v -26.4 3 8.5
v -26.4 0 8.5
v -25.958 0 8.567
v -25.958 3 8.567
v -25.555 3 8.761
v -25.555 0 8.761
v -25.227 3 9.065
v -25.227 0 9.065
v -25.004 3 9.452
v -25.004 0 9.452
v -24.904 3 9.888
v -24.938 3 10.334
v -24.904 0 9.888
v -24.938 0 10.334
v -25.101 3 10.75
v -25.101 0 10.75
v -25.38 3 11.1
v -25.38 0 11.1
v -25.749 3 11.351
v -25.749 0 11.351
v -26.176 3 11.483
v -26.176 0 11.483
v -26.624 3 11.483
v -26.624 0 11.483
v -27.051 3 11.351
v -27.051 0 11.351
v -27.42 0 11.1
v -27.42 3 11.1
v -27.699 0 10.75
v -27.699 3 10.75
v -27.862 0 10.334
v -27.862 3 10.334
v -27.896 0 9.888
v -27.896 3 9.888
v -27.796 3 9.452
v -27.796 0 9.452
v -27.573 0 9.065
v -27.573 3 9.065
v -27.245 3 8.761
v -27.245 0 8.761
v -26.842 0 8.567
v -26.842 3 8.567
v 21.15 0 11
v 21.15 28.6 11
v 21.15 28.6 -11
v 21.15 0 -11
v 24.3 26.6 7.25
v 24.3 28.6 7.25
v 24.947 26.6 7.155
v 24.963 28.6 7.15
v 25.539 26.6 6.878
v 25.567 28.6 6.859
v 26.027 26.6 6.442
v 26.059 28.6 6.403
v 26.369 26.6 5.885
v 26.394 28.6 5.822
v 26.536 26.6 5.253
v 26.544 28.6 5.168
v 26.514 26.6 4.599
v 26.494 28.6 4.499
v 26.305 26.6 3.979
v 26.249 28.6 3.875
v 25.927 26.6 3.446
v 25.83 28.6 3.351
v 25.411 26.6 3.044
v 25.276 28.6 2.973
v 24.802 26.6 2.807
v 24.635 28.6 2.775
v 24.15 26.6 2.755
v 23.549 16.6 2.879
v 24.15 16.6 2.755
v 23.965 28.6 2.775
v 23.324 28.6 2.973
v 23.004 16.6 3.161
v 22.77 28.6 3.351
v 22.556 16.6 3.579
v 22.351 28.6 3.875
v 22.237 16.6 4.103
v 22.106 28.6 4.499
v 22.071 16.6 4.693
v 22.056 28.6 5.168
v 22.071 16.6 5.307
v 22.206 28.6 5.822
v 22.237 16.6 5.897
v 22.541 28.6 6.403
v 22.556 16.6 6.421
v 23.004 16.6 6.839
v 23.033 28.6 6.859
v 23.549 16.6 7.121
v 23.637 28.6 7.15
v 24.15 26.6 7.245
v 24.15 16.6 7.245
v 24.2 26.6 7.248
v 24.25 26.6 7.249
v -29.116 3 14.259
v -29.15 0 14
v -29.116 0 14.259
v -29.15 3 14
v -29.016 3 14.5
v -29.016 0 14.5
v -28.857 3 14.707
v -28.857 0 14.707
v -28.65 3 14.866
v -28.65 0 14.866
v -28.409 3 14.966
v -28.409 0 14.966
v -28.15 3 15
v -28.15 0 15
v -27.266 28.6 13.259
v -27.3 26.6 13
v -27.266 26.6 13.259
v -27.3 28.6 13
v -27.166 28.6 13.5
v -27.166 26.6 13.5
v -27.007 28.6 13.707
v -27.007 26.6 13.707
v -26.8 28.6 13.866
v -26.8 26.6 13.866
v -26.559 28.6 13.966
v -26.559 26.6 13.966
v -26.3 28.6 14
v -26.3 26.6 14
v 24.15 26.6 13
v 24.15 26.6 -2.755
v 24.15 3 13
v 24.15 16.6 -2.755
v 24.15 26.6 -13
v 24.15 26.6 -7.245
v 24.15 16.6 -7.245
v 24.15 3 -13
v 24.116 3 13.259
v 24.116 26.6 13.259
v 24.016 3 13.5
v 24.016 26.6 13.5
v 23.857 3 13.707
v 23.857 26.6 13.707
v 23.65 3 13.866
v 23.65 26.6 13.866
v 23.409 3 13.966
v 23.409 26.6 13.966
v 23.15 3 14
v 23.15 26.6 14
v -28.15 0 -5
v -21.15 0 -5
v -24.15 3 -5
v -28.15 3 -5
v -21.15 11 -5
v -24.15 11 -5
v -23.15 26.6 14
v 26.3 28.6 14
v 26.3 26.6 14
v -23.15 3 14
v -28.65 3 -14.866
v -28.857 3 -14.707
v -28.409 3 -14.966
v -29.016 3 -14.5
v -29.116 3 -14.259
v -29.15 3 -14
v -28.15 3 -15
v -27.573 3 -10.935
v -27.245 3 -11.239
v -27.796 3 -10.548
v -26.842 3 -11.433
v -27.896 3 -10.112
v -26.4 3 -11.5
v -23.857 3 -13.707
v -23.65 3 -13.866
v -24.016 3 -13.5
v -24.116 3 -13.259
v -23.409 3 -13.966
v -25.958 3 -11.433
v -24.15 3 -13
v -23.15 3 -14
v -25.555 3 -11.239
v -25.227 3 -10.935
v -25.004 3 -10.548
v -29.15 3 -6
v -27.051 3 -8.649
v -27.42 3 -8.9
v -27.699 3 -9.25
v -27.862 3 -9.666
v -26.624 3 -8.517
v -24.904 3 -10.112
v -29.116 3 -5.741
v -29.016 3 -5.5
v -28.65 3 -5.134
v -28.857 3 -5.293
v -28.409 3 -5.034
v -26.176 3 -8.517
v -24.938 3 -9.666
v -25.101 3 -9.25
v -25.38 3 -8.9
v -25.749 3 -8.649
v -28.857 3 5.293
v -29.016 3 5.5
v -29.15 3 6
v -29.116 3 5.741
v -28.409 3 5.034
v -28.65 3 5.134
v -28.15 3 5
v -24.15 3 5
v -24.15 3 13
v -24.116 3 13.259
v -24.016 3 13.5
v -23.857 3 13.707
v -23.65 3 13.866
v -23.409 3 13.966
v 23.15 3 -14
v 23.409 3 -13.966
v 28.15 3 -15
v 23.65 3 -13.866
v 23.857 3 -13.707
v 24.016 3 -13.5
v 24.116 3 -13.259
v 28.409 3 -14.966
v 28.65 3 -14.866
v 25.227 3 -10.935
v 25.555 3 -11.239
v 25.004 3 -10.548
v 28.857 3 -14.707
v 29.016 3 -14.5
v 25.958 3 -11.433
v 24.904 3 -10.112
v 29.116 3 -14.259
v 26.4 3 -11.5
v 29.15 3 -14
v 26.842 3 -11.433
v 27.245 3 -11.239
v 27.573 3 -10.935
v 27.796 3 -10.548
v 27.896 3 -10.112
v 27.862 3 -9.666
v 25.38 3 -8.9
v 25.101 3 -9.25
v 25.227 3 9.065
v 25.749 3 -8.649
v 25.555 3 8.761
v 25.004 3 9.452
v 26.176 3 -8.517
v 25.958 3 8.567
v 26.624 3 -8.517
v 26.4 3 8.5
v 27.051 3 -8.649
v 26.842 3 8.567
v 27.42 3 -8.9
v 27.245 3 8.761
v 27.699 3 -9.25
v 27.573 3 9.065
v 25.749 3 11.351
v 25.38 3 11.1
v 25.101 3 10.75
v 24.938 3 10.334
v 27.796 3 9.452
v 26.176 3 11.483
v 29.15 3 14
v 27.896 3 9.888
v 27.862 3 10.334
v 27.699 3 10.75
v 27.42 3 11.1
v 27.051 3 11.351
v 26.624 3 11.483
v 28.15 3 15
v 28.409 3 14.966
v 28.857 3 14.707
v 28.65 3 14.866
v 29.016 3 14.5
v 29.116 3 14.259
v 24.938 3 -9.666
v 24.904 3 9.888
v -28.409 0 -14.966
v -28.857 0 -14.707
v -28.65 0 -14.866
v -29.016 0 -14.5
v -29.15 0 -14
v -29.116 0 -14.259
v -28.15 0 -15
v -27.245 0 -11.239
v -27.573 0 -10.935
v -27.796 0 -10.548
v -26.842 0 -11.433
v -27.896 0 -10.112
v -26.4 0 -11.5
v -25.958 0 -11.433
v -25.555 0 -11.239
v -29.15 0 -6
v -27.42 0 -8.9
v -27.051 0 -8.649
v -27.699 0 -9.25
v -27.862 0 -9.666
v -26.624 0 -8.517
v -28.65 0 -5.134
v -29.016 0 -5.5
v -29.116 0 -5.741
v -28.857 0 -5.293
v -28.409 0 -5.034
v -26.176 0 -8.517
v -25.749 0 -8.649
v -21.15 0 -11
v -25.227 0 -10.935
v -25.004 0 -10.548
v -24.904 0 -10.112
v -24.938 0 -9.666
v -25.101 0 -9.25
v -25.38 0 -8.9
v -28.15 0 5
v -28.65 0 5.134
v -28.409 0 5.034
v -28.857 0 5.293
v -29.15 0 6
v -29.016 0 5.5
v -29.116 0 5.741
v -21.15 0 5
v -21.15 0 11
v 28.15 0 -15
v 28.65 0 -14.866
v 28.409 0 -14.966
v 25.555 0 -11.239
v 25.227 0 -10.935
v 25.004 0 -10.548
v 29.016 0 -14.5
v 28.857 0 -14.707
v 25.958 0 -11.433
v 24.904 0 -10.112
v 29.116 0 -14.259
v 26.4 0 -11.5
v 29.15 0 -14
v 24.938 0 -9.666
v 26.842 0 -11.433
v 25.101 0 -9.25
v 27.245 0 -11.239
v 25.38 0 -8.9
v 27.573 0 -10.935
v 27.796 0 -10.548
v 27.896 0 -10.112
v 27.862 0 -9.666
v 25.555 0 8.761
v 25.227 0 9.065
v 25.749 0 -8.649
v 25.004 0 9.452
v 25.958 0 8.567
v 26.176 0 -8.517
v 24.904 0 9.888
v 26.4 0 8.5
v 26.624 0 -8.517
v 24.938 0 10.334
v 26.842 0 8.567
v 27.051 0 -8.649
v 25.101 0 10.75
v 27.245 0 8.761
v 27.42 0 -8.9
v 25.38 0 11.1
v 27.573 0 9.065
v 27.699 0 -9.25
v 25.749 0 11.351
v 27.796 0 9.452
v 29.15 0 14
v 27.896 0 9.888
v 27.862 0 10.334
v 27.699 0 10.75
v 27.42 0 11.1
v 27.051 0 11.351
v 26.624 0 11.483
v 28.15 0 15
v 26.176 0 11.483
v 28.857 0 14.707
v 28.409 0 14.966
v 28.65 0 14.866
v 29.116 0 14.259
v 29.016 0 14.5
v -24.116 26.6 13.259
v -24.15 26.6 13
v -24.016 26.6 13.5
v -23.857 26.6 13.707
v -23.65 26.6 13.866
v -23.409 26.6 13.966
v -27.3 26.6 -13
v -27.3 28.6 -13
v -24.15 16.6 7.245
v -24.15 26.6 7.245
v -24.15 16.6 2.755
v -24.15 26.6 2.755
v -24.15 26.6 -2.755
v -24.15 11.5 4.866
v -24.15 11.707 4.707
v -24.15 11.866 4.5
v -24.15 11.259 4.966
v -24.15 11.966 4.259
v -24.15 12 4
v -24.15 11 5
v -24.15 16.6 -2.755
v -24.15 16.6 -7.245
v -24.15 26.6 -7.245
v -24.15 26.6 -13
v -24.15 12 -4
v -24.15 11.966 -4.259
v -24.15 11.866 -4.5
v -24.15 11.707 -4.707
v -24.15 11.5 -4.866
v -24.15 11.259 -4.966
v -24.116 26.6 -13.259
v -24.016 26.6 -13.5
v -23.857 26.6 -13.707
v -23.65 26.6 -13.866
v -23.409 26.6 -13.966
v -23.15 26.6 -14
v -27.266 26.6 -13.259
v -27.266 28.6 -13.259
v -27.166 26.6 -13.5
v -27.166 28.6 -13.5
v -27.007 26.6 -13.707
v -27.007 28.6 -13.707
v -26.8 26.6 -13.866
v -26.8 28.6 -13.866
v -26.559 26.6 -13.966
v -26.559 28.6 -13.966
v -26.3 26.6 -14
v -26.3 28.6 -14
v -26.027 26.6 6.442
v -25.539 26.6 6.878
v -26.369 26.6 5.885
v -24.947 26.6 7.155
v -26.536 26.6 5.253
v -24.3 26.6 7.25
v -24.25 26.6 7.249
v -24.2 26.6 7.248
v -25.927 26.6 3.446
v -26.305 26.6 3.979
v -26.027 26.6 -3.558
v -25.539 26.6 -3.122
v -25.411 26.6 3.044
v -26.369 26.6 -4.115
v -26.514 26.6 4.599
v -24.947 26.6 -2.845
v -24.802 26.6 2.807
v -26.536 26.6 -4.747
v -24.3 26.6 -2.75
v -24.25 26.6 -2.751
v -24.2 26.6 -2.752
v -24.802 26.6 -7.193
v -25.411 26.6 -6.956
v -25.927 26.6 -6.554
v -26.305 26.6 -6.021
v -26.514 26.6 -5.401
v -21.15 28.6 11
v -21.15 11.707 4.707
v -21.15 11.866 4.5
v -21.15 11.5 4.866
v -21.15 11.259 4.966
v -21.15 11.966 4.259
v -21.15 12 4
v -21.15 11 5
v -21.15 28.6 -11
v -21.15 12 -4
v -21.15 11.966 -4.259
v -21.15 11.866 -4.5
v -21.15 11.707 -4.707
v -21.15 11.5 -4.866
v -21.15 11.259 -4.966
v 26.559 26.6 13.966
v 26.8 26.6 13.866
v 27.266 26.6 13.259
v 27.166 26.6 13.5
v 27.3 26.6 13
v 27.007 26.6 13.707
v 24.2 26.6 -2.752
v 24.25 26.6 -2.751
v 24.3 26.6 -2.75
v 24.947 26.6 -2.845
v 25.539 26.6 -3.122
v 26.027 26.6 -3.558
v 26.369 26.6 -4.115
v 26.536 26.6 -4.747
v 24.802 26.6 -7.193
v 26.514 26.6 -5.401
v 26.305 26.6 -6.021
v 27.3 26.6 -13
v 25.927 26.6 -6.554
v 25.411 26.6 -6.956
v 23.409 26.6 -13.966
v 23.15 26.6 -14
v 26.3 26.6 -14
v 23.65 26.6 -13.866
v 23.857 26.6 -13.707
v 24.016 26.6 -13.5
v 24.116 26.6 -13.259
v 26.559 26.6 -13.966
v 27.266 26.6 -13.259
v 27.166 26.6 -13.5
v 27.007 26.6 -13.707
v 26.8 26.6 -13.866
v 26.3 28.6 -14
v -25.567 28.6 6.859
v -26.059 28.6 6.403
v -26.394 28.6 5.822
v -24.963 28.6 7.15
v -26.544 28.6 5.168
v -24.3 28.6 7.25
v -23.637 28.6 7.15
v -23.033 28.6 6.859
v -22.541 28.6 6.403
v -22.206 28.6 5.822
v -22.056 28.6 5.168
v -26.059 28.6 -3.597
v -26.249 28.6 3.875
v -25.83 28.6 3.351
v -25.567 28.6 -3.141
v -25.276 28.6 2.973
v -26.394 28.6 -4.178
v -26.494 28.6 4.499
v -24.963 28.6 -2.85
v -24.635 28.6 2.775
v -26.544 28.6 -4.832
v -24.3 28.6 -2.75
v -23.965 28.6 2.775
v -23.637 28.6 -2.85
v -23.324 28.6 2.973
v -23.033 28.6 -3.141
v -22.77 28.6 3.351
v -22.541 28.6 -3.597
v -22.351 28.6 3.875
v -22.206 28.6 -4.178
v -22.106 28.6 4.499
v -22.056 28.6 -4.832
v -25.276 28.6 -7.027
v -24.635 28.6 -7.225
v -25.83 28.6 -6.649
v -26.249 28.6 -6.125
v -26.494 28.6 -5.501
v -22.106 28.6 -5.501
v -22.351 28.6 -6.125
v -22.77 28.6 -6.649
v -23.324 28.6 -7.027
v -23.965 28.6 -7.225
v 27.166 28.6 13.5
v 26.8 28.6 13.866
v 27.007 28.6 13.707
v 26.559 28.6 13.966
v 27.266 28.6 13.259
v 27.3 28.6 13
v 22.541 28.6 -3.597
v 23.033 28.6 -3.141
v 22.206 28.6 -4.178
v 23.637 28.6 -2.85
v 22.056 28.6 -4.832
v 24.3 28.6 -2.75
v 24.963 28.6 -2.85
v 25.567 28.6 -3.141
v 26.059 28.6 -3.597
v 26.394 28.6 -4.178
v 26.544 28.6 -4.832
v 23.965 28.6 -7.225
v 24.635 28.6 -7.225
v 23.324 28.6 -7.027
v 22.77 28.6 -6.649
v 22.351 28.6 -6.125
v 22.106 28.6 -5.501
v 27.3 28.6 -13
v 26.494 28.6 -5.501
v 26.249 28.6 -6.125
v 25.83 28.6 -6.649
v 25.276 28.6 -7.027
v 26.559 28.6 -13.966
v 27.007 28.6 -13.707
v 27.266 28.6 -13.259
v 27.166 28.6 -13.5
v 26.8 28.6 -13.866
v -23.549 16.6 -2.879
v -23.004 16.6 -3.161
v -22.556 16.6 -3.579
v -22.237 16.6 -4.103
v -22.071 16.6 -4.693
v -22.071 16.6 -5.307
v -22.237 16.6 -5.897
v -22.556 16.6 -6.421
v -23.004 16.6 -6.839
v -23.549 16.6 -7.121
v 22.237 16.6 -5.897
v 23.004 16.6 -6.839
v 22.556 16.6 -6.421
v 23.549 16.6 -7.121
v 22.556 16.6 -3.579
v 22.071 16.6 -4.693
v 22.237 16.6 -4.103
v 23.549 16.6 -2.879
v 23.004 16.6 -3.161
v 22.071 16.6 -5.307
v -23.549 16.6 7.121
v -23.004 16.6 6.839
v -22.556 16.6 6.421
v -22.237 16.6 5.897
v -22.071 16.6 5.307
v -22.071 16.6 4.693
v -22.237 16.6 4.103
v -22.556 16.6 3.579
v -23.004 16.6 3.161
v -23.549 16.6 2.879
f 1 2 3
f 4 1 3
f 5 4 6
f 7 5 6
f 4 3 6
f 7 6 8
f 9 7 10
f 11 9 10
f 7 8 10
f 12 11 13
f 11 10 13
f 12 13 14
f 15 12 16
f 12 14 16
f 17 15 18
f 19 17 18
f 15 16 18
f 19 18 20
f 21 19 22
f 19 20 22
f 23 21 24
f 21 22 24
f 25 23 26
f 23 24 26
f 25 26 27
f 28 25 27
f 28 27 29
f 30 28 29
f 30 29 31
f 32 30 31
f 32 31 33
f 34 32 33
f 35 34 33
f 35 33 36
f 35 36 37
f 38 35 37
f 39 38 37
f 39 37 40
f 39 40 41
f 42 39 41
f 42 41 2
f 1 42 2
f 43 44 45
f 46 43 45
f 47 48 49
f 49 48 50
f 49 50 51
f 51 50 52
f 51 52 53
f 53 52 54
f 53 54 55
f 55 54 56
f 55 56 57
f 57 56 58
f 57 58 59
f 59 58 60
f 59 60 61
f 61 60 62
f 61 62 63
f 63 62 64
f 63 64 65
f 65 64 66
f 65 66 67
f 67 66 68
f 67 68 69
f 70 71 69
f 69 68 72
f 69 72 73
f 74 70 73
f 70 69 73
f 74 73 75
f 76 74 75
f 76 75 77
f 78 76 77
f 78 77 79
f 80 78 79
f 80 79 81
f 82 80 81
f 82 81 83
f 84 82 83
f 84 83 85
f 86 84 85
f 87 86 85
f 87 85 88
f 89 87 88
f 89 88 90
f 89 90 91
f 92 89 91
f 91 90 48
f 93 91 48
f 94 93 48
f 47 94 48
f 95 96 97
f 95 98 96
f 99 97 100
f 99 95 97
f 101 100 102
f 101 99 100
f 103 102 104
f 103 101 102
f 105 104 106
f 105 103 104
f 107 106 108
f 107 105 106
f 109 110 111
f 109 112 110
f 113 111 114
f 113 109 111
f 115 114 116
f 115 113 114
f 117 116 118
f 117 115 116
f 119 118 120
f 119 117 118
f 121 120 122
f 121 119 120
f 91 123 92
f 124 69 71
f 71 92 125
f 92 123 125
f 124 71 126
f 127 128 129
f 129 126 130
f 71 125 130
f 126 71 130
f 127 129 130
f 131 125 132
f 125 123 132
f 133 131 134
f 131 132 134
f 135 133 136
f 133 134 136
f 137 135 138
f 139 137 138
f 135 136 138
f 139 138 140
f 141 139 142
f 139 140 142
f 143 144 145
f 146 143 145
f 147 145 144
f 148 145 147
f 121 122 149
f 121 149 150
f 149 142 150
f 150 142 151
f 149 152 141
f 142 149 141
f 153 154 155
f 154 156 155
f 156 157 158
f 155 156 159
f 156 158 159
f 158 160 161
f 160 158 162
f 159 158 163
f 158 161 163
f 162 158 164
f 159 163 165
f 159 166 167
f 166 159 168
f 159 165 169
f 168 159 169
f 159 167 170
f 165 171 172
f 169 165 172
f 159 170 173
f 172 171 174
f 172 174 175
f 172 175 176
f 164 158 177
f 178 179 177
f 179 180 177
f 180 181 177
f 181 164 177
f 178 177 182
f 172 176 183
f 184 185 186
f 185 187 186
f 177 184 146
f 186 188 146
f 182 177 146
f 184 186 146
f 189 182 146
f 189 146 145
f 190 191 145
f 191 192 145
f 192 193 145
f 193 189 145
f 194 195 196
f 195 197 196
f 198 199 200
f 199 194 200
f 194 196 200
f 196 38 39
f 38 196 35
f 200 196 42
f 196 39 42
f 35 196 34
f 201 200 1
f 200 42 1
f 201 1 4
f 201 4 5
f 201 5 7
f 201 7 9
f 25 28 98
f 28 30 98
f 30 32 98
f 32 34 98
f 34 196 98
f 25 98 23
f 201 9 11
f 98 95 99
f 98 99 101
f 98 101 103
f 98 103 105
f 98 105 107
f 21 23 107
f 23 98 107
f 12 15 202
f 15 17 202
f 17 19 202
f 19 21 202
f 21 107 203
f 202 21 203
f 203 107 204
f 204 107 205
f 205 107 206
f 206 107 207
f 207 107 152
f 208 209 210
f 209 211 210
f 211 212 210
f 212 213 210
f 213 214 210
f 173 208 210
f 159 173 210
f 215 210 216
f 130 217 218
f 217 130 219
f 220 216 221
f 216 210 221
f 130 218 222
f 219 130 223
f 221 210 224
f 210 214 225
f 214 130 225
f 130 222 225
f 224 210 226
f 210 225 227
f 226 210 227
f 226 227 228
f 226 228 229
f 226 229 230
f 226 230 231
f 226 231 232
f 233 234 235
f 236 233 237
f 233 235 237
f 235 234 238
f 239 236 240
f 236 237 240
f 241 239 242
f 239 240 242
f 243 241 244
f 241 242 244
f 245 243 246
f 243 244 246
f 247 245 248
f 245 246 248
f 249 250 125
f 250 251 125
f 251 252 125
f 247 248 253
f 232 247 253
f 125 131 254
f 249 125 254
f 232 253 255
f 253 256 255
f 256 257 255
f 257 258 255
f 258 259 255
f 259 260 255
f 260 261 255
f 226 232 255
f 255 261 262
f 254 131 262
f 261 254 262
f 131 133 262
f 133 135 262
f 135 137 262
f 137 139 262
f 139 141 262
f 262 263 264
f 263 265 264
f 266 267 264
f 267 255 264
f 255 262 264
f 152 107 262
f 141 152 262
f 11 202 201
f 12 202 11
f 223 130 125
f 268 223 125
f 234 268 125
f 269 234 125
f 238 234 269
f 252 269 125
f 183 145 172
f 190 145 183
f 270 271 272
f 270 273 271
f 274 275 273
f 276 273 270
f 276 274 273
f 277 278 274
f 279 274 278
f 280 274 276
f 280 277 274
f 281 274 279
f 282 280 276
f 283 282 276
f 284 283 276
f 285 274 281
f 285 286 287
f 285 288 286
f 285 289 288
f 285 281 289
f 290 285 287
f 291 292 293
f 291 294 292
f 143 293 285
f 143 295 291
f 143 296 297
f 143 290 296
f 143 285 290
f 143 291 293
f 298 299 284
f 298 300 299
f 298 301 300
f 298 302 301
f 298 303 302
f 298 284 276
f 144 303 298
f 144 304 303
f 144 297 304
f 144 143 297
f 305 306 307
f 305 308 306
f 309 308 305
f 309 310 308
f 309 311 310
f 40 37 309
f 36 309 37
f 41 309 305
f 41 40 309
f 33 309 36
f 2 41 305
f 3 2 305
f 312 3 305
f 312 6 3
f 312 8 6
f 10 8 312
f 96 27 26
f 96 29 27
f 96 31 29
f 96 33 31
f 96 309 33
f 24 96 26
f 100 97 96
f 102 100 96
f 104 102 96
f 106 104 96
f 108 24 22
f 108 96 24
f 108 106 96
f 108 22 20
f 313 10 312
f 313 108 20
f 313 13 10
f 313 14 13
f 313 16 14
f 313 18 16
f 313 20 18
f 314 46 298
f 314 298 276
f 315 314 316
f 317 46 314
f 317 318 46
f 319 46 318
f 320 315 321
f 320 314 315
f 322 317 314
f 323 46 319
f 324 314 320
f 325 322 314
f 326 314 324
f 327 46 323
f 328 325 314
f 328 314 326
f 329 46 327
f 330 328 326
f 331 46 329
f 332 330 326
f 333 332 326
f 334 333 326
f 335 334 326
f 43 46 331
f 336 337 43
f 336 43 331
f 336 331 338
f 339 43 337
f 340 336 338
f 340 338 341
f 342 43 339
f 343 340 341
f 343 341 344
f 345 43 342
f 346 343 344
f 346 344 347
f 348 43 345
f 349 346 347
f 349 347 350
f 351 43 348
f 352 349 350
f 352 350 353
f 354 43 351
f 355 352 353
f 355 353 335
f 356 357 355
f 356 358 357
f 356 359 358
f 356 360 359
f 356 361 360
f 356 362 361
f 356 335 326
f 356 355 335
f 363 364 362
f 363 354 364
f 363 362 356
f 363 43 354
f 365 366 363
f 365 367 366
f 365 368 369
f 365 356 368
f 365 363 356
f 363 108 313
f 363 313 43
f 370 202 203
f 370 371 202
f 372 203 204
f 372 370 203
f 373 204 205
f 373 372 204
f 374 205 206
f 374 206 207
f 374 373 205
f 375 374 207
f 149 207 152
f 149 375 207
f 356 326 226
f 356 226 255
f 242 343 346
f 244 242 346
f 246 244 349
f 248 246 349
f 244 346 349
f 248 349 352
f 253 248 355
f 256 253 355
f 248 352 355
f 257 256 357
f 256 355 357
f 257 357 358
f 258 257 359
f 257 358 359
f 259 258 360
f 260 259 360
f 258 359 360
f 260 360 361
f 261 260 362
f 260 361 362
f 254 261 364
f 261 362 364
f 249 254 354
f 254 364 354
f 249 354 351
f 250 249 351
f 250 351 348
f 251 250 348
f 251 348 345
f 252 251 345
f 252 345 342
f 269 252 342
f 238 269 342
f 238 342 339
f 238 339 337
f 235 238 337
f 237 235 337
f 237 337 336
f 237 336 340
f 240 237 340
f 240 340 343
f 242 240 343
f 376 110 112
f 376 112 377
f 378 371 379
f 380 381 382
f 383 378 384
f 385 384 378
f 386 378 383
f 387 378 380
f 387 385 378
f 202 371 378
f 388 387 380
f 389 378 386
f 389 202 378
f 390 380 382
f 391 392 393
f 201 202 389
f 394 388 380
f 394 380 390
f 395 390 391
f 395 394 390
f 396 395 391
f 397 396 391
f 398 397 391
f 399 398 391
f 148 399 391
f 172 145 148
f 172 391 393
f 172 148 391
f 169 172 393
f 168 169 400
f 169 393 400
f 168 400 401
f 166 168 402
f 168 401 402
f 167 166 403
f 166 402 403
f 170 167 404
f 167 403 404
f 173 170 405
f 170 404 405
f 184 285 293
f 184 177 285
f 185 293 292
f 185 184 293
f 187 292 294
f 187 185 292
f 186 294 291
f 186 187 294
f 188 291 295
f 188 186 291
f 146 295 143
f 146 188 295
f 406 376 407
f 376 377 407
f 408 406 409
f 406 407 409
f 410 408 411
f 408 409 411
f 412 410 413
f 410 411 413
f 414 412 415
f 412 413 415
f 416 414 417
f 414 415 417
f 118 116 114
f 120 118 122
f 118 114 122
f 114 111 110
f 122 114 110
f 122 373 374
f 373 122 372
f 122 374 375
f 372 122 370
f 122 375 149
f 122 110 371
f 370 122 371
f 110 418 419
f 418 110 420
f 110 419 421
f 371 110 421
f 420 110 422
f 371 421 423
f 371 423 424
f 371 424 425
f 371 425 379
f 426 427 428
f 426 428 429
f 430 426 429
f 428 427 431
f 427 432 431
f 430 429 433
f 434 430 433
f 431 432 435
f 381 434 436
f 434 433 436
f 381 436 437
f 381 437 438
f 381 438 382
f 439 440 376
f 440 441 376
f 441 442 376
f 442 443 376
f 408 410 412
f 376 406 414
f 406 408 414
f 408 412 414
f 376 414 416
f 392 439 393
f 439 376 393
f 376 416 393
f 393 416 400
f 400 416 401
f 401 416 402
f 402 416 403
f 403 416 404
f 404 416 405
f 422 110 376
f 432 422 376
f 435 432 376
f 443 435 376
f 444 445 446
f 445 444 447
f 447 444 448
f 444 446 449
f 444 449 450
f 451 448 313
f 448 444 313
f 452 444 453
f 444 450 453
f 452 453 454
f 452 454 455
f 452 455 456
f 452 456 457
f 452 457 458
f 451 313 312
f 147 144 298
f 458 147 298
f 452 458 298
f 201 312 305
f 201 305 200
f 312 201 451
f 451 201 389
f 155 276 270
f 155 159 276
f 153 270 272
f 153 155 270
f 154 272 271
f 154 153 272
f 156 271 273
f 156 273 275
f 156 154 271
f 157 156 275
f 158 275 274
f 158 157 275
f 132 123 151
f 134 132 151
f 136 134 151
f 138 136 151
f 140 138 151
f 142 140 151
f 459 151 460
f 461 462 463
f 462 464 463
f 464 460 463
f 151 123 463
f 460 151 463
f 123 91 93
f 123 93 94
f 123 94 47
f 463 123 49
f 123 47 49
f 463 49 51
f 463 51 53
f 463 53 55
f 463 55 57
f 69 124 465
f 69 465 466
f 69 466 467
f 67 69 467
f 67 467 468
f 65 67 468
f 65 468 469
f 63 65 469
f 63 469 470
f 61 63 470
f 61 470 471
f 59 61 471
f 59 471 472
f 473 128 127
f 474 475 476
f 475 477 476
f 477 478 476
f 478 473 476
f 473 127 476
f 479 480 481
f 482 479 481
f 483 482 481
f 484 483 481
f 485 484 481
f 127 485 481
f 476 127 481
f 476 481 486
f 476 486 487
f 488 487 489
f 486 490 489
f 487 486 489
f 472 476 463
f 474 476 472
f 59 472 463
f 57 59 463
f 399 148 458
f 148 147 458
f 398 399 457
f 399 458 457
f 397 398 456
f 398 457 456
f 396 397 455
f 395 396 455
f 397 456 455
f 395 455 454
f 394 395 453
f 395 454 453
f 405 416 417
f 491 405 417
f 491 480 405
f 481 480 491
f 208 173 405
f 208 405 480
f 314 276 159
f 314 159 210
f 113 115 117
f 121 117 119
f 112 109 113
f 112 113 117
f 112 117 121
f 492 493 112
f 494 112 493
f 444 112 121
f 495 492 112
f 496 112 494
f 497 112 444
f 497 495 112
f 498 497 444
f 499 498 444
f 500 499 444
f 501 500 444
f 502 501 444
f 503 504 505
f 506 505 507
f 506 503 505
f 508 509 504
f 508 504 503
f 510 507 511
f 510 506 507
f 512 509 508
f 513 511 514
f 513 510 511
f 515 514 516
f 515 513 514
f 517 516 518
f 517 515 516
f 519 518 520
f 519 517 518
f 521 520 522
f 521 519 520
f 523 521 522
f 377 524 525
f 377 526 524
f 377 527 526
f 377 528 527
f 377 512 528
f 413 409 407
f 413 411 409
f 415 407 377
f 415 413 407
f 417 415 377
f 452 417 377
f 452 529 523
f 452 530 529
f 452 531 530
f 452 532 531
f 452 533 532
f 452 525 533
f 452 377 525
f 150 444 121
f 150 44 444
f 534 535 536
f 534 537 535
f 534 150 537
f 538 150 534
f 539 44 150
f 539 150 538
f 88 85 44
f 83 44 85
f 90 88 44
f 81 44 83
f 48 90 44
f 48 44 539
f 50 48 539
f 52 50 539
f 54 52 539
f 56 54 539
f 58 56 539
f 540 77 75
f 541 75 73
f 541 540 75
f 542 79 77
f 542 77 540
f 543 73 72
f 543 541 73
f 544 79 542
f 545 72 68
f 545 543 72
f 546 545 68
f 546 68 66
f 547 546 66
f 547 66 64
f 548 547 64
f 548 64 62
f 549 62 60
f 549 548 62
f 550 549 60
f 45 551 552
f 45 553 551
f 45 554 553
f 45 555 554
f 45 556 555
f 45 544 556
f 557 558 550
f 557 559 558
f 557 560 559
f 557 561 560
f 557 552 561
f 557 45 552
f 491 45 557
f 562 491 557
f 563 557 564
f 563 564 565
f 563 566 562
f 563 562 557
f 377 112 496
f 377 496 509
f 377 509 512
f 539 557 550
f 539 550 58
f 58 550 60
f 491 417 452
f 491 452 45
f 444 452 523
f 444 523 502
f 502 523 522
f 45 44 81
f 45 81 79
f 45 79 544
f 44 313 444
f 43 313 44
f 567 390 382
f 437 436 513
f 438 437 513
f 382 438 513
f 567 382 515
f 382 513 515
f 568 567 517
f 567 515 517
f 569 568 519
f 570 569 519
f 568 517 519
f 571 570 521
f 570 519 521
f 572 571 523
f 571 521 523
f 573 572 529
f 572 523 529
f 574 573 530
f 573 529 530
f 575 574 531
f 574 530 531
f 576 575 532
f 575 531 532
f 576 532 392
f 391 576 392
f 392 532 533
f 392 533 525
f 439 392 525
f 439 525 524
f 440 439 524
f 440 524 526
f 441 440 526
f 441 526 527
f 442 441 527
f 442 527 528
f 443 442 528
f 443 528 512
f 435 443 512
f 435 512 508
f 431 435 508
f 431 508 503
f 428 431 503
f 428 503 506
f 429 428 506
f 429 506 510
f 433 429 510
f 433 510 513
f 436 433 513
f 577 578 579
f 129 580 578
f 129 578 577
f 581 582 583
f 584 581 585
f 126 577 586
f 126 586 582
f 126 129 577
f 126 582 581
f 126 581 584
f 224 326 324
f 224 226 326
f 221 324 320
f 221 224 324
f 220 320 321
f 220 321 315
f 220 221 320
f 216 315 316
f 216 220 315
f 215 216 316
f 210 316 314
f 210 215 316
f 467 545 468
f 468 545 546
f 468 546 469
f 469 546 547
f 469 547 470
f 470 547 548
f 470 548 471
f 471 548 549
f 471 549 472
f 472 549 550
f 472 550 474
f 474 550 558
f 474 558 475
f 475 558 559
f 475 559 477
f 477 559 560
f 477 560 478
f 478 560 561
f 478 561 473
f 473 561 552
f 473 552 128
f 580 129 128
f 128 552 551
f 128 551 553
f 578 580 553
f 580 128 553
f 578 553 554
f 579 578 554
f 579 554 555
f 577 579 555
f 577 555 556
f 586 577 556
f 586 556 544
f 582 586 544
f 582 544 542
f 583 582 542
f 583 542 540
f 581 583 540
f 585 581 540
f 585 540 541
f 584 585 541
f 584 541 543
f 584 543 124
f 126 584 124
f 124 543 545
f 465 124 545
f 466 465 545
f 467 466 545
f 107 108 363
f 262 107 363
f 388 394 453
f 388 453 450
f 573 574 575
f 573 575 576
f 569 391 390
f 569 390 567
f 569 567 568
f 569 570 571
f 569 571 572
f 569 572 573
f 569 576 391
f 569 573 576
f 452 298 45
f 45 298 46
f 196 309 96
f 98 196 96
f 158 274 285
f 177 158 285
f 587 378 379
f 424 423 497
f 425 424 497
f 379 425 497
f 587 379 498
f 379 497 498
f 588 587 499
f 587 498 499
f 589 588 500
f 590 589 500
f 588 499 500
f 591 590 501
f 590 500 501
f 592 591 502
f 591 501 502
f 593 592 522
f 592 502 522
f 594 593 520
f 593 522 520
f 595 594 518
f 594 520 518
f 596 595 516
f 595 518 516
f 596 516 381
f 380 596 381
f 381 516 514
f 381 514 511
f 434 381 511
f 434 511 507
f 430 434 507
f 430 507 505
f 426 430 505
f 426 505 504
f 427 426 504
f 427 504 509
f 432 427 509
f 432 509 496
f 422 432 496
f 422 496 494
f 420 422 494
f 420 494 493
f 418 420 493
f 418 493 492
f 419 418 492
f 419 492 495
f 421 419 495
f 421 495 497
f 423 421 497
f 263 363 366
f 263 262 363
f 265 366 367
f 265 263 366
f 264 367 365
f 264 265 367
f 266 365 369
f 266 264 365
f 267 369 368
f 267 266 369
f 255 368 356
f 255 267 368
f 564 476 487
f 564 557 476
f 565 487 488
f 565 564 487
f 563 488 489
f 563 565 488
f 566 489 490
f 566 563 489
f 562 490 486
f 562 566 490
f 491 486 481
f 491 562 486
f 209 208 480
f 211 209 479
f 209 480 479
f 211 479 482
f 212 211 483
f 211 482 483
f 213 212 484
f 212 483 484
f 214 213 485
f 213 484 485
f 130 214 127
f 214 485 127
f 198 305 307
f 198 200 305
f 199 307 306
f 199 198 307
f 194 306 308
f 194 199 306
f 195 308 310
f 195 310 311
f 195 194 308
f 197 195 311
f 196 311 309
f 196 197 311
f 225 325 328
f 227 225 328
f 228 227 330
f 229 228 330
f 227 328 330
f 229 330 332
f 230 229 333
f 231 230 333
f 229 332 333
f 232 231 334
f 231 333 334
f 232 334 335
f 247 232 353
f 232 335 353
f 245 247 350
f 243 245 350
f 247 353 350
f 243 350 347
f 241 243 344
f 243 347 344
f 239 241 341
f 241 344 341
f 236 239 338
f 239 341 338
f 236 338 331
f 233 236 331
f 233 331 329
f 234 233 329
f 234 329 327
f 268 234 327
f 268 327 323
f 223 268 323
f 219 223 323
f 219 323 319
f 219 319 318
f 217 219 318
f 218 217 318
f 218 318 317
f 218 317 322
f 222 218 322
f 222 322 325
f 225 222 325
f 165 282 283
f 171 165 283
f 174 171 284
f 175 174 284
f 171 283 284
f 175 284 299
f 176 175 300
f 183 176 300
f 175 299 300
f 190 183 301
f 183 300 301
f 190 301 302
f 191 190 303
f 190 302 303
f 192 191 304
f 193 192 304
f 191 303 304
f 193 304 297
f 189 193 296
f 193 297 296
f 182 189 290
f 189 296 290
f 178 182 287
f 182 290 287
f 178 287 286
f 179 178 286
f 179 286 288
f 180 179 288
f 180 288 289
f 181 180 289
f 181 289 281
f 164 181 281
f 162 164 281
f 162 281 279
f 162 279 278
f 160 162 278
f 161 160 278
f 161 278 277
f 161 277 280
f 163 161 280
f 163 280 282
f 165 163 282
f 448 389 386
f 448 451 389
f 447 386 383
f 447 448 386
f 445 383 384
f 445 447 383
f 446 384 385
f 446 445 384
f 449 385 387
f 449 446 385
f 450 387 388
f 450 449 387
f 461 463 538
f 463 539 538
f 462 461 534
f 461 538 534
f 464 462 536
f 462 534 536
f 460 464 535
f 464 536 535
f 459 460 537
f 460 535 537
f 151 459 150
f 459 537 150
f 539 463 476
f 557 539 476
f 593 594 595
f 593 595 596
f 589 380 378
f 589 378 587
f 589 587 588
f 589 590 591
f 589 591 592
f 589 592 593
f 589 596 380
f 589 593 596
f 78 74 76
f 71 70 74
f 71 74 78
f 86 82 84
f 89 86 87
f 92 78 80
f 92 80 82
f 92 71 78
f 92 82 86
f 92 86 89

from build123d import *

# Parameters (mm, degrees)
SKETCH1_W           = 48.3
SKETCH1_H           = 28
SKETCH1_W_2         = 42.3
SKETCH1_H_2         = 22
BOSS_EXTRUDE1_DEPTH = 26.6
SKETCH2_W           = 54.6
SKETCH2_H           = 28
SKETCH2_W_2         = 42.3
SKETCH2_H_2         = 22
BOSS_EXTRUDE2_DEPTH = 2
SKETCH4_R           = 2.25
CUT_EXTRUDE1_DEPTH  = 12
SKETCH5_W           = 58.3
SKETCH5_H           = 30
SKETCH5_W_2         = 48.3
SKETCH5_H_2         = 28
BOSS_EXTRUDE3_DEPTH = 3
SKETCH6_W           = 10
SKETCH6_H           = 24
CUT_EXTRUDE2_DEPTH  = 10
SKETCH7_R           = 1.5
CUT_EXTRUDE3_DEPTH  = 10
FILLET1_R           = 1
FILLET2_R           = 1
FILLET3_R           = 1


with BuildPart() as part:
    # Sketch1 → Boss-Extrude1 (new body)
    with BuildSketch(Plane(origin=(0, 0, 0), x_dir=(1, 0, 0), z_dir=(0, 1, 0))):
        Rectangle(SKETCH1_W, SKETCH1_H)
        Rectangle(SKETCH1_W_2, SKETCH1_H_2, mode=Mode.SUBTRACT)
    extrude(amount=BOSS_EXTRUDE1_DEPTH)

    # Sketch2 → Boss-Extrude2 (add)
    with BuildSketch(Plane(origin=(0, 26.6, 0), x_dir=(1, 0, 0), z_dir=(0, 1, 0))):
        Rectangle(SKETCH2_W, SKETCH2_H)
        Rectangle(SKETCH2_W_2, SKETCH2_H_2, mode=Mode.SUBTRACT)
    extrude(amount=BOSS_EXTRUDE2_DEPTH)

    # Sketch4 → Cut-Extrude1 (cut)
    with BuildSketch(Plane(origin=(0, 28.6, 0), x_dir=(1, 0, 0), z_dir=(0, 1, 0))):
        with Locations(Location((-24.3, 5, 0), (0, 0, 270))):
            Circle(SKETCH4_R)
        with Locations(Location((-24.3, -5, 0), (0, 0, 270))):
            Circle(SKETCH4_R)
        with Locations(Location((24.3, 5, 0), (0, 0, 270))):
            Circle(SKETCH4_R)
        with Locations(Location((24.3, -5, 0), (0, 0, 270))):
            Circle(SKETCH4_R)
    extrude(amount=-CUT_EXTRUDE1_DEPTH, mode=Mode.SUBTRACT)

    # Sketch5 → Boss-Extrude3 (add)
    with BuildSketch(Plane.XZ):
        Rectangle(SKETCH5_W, SKETCH5_H)
        Rectangle(SKETCH5_W_2, SKETCH5_H_2, mode=Mode.SUBTRACT)
    extrude(amount=-BOSS_EXTRUDE3_DEPTH)

    # Sketch6 → Cut-Extrude2 (cut)
    with BuildSketch(Plane.ZY.offset(29.15)):
        Rectangle(SKETCH6_W, SKETCH6_H)
    extrude(amount=-CUT_EXTRUDE2_DEPTH, mode=Mode.SUBTRACT)

    # Sketch7 → Cut-Extrude3 (cut)
    with BuildSketch(Plane.XZ):
        with Locations(Location((-26.4, 10, 0), (0, 0, 270))):
            Circle(SKETCH7_R)
        with Locations(Location((-26.4, -10, 0), (0, 0, 270))):
            Circle(SKETCH7_R)
        with Locations(Location((26.4, 10, 0), (0, 0, 270))):
            Circle(SKETCH7_R)
        with Locations(Location((26.4, -10, 0), (0, 0, 270))):
            Circle(SKETCH7_R)
    extrude(amount=-CUT_EXTRUDE3_DEPTH, mode=Mode.SUBTRACT)

    # Fillet1
    fillet1_edges = [part.edges().sort_by_distance(p)[0] for p in [
        (-24.15, 14.8, -14),
        (24.15, 14.8, -14),
        (24.15, 14.8, 14),
        (-24.15, 14.8, 14),
    ]]
    fillet(fillet1_edges, radius=FILLET1_R)

    # Fillet2
    fillet2_edges = [part.edges().sort_by_distance(p)[0] for p in [
        (-29.15, 1.5, 5),
        (-29.15, 1.5, -5),
        (27.3, 27.6, 14),
        (27.3, 27.6, -14),
        (-27.3, 27.6, -14),
        (-27.3, 27.6, 14),
        (29.15, 1.5, 15),
        (29.15, 1.5, -15),
        (-29.15, 1.5, -15),
        (-29.15, 1.5, 15),
    ]]
    fillet(fillet2_edges, radius=FILLET2_R)

    # Fillet3
    fillet3_edges = [part.edges().sort_by_distance(p)[0] for p in [
        (-22.65, 12, -5),
        (-22.65, 12, 5),
    ]]
    fillet(fillet3_edges, radius=FILLET3_R)


solid = part.part
